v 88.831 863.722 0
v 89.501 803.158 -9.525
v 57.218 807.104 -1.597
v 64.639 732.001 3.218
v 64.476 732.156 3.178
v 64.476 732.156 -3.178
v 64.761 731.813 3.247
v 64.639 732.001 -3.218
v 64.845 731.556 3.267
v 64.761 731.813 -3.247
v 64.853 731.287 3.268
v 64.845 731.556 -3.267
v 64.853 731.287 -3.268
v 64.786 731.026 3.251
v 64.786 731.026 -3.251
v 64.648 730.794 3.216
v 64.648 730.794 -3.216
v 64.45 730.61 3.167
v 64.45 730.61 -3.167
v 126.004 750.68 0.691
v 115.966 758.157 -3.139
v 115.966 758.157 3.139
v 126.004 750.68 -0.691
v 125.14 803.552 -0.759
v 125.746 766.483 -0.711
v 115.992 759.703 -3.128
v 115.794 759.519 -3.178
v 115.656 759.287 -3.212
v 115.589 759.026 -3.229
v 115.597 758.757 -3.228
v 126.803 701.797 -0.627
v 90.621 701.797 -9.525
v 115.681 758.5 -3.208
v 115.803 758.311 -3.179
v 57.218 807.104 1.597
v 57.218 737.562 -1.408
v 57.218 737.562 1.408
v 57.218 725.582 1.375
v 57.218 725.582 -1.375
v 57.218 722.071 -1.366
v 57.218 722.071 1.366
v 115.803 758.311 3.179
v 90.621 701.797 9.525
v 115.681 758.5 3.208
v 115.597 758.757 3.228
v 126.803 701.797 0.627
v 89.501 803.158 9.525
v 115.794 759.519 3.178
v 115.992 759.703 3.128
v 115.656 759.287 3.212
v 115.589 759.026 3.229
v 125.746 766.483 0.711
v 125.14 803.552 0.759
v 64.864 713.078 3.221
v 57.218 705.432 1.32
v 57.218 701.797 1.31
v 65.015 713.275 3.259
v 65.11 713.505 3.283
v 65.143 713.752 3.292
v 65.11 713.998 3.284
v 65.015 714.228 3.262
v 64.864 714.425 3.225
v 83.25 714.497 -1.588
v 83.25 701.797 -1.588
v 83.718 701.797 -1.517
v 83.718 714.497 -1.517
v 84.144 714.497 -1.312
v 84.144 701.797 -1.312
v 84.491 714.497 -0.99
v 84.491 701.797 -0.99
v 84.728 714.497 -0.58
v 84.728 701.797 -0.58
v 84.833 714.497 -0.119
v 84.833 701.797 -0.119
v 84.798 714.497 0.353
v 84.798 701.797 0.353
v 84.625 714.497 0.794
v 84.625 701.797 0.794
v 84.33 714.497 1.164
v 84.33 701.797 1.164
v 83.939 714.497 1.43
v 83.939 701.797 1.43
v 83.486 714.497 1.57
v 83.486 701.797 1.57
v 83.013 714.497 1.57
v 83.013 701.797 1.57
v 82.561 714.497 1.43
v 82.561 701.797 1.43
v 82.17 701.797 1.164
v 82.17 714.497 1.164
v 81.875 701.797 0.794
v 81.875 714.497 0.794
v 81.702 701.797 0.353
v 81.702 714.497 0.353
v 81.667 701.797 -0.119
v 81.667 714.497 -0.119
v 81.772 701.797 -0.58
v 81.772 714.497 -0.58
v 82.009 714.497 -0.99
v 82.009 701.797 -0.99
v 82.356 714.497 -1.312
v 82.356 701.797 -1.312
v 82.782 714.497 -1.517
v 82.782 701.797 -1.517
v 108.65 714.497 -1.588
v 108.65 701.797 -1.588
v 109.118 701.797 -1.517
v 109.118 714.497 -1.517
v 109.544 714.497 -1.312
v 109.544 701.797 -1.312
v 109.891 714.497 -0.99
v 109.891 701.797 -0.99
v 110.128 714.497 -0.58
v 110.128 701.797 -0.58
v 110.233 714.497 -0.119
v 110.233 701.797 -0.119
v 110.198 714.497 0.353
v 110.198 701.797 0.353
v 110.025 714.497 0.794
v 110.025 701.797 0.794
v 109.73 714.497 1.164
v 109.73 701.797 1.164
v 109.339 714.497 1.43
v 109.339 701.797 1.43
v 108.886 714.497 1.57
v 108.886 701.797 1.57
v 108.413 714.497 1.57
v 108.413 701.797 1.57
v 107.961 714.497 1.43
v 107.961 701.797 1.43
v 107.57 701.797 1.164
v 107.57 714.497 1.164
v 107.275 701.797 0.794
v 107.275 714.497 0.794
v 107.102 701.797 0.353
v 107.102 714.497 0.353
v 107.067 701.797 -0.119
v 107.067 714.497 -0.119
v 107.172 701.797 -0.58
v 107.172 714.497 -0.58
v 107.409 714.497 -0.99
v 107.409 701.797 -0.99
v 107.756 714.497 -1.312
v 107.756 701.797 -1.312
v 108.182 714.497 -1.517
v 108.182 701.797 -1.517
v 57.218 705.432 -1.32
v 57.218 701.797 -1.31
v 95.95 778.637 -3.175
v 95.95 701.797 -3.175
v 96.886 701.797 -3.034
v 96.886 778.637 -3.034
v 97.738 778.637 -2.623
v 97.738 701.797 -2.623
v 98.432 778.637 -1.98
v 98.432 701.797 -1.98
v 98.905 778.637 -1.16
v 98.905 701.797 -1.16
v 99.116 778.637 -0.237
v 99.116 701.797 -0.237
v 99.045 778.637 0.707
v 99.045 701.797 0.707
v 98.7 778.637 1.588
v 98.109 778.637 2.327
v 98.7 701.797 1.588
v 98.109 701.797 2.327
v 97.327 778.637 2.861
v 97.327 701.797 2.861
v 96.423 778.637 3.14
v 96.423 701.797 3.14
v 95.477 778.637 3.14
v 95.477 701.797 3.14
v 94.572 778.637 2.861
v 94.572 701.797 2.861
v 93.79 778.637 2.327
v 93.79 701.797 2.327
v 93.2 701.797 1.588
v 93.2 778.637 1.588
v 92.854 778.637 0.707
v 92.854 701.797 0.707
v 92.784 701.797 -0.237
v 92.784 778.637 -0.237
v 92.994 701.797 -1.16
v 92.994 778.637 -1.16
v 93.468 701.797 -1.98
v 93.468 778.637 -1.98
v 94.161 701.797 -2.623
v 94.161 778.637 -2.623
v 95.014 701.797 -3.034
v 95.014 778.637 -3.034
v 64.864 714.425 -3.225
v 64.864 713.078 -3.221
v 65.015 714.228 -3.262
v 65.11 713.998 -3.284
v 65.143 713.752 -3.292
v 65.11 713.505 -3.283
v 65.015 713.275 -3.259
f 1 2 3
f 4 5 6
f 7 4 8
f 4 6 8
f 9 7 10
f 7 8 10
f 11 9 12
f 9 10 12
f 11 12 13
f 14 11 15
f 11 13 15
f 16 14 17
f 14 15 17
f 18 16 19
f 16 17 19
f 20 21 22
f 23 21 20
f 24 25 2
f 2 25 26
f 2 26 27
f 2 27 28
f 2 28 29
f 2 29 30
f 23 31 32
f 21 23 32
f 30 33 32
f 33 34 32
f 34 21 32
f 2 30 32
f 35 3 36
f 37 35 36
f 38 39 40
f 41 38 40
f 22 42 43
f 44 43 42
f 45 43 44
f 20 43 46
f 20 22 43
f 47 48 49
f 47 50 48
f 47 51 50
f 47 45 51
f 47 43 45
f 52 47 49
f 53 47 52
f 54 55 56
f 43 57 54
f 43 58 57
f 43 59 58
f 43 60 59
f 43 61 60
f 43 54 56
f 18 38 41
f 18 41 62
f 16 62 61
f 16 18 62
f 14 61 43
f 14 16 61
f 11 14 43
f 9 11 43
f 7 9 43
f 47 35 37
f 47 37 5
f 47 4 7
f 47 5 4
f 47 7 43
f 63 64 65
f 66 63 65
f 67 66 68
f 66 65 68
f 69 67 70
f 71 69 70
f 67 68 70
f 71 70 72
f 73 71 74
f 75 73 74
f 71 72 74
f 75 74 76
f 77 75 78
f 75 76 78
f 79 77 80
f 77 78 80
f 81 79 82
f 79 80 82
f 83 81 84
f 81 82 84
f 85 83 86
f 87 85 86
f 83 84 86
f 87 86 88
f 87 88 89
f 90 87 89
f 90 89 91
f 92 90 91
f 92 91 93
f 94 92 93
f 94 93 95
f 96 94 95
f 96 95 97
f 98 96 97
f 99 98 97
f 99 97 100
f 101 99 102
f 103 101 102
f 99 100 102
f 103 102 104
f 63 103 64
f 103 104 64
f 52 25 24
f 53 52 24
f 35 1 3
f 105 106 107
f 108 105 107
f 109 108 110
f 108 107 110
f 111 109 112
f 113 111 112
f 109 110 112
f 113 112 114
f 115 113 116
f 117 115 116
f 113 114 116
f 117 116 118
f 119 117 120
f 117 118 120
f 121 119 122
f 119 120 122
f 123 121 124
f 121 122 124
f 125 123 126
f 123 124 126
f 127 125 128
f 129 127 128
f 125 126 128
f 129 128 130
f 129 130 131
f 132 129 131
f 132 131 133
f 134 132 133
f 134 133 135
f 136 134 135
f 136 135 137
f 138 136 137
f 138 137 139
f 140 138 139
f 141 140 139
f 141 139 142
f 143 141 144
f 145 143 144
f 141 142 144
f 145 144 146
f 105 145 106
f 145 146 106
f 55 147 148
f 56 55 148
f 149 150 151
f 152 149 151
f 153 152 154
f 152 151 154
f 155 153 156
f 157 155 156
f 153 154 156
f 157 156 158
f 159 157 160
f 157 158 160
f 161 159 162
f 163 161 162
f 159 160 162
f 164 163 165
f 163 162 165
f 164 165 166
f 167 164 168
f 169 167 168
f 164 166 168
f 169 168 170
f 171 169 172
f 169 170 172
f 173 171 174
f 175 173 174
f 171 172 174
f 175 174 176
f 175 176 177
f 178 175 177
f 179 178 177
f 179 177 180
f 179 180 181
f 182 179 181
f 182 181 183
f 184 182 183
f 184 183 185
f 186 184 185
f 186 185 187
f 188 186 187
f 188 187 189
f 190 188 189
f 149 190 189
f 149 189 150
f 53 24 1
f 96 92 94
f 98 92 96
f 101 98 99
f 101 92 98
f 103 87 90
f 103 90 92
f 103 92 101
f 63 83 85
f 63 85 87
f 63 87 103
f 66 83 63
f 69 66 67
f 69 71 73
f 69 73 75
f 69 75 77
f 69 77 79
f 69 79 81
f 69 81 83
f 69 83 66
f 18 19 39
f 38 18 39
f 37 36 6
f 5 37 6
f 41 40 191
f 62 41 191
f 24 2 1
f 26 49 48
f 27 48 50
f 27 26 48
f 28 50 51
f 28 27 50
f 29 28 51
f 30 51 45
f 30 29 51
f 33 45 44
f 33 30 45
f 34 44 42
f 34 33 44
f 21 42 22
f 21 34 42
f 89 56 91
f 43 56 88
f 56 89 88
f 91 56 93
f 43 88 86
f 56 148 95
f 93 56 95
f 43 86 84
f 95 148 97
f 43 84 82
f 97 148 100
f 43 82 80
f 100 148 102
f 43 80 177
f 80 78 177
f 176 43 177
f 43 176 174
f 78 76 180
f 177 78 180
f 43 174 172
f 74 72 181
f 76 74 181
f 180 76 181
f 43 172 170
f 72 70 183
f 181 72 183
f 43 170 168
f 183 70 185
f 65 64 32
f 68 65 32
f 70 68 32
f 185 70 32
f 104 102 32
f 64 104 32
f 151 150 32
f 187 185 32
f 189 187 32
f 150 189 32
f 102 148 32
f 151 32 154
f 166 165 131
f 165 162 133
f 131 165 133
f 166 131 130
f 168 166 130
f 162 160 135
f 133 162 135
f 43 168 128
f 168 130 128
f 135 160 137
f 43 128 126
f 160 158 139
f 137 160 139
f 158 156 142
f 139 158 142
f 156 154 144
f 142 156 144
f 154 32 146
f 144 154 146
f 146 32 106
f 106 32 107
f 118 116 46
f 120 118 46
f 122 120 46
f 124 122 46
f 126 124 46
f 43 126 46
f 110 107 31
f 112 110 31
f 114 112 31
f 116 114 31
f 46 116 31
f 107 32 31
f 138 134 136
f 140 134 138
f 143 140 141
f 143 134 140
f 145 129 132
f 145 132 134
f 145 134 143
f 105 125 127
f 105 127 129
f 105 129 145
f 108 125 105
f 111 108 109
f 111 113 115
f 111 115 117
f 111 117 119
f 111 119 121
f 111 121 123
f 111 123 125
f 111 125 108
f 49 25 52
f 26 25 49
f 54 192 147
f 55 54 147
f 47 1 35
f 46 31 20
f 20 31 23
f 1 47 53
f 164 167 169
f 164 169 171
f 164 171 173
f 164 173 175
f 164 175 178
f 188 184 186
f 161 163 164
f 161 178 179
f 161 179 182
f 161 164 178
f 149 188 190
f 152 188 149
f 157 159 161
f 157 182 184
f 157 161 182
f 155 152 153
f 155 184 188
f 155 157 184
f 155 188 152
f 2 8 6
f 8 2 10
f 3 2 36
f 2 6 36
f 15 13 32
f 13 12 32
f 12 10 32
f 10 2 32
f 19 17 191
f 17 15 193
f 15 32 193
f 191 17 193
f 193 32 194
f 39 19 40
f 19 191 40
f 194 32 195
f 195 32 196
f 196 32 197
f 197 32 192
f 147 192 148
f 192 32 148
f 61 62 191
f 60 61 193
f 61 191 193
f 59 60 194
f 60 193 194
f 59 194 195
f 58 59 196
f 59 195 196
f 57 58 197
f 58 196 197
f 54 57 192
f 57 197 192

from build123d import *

# Parameters (mm, degrees)
BOSS_EXTRUDE1_DEPTH      = 9.525
BOSS_EXTRUDE1_DEPTH_BACK = 9.525
CUT_SWEEP2_START         = 153.457157687
CUT_SWEEP2_OUTLINE_W     = 59
CUT_SWEEP2_OUTLINE_H     = 64
CUT_SWEEP2_DEPTH         = 10.542842313
CUT_SWEEP6_START         = 153.457157687
CUT_SWEEP6_OUTLINE_W     = 53
CUT_SWEEP6_OUTLINE_H     = 64
CUT_SWEEP6_DEPTH         = 9.143384714
SKETCH21_W               = 71.62814367
SKETCH21_H               = 75.485551221
CUT_EXTRUDE5_DEPTH       = 47.371
CUT_EXTRUDE6_DEPTH       = 875.211365037
CUT_EXTRUDE6_DEPTH_BACK  = 875.211365037
SKETCH23_R               = 3.175
CUT_EXTRUDE7_DEPTH       = 558.8
CUT_EXTRUDE17_DEPTH      = 875.211365037
CUT_EXTRUDE17_DEPTH_BACK = 875.211365037
SKETCH24_W               = 149.671164142
SKETCH24_H               = 168.486967634
SKETCH24_H_2             = 161.925
SKETCH31_R               = 1.5875
CUT_EXTRUDE18_DEPTH      = 12.7


with BuildPart() as part:
    # Sketch1 → Boss-Extrude1 (new, two sides: drawn at the far end of the back side and taken through both)
    with BuildSketch(Plane.XY.offset(-BOSS_EXTRUDE1_DEPTH_BACK)):
        Polygon((57.217766507, 219.836565958), (134.681996719, 219.836565958), (125.140068317, 803.55209701), (88.830980485, 863.721914098), (57.217766507, 807.103985498), align=None)
    extrude(amount=BOSS_EXTRUDE1_DEPTH + BOSS_EXTRUDE1_DEPTH_BACK)

    # Cut-Sweep1: sweep along a path in Sketch4
    with BuildLine(Plane.XY.offset(9.525)) as cut_sweep1_path:
        Line((95.949881613, 219.836565958), (88.830980485, 863.721914098))
    # Sketch2 → Cut-Sweep1 (sweep, cut)
    with BuildSketch(Plane.XZ.offset(-219.836565958)):
        Polygon((95.949881613, 9.525), (134.681996719, 0), (134.681996719, 9.525), align=None)
    sweep(path=cut_sweep1_path.line, mode=Mode.SUBTRACT)

    # Cut-Sweep2: read off the stored shape, not the designer's step
    # Cut-Sweep2 outline → Cut-Sweep2 (cut)
    with BuildSketch(Plane(origin=(0, 0, 0), x_dir=(0.9721406430200956, -0.0370263288920756, -0.23145544097568965), z_dir=(0.2343983152423991, 0.15356253367517805, 0.9599354030677193)).offset(CUT_SWEEP2_START)):
        with Locations((63.5, 822)):
            Rectangle(CUT_SWEEP2_OUTLINE_W, CUT_SWEEP2_OUTLINE_H)
    extrude(amount=CUT_SWEEP2_DEPTH, mode=Mode.SUBTRACT)

    # Cut-Sweep3: sweep along a path in Sketch8
    with BuildLine(Plane.XY.offset(9.525)) as cut_sweep3_path:
        Line((95.949881613, 219.836565958), (88.830980485, 863.721914098))
    # Sketch7 → Cut-Sweep3 (sweep, cut)
    with BuildSketch(Plane.XZ.offset(-219.836565958)):
        Polygon((95.949881613, 9.525), (57.217766507, 0), (57.217766507, 9.525), align=None)
    sweep(path=cut_sweep3_path.line, mode=Mode.SUBTRACT)

    # Cut-Sweep4: sweep along a path in Sketch10
    with BuildLine(Plane(origin=(3.4015871, 0.0376085, -13.832090615), x_dir=(0.9710677735095292, -0.0006492893666849942, 0.23880317768941897), z_dir=(-0.23880406037428656, -0.002640256529482778, 0.9710641841784778))) as cut_sweep4_path:
        Line((55.419591582, 807.105343631), (88.664251397, 803.18099011))
    # Sketch9 → Cut-Sweep4 (sweep, cut)
    with BuildSketch(Plane(origin=(98.36840601, 1.087577095, 0), x_dir=(0, 0, 1), z_dir=(-0.9999388862366849, -0.011055486951654862, 0))):
        Polygon((9.525, 802.119504525), (27.927952665, 862.687059056), (0, 862.687059056), align=None)
    sweep(path=cut_sweep4_path.line, mode=Mode.SUBTRACT)

    # Cut-Sweep5: sweep along a path in Sketch12
    with BuildLine(Plane(origin=(0, 0, -9.525), x_dir=(-1, 0, 0), z_dir=(0, 0, -1))) as cut_sweep5_path:
        Line((-88.830980485, 863.721914098), (-95.949881613, 219.836565958))
    # Sketch11 → Cut-Sweep5 (sweep, cut)
    with BuildSketch(Plane.XZ.offset(-219.836565958)):
        Polygon((95.949881613, -9.525), (134.681996719, 0), (134.681996719, -15.883536915), (57.217766507, -15.883536915), (57.217766507, 0), align=None)
    sweep(path=cut_sweep5_path.line, mode=Mode.SUBTRACT)

    # Cut-Sweep6: read off the stored shape, not the designer's step
    # Cut-Sweep6 outline → Cut-Sweep6 (cut)
    with BuildSketch(Plane(origin=(0, 0, 0), x_dir=(0.9721406430200958, -0.03702632889207545, 0.2314554409756887), z_dir=(0.23439831524239813, 0.1535625336751781, -0.9599354030677195)).offset(CUT_SWEEP6_START)):
        with Locations((66.5, -822)):
            Rectangle(CUT_SWEEP6_OUTLINE_W, CUT_SWEEP6_OUTLINE_H)
    extrude(amount=CUT_SWEEP6_DEPTH, mode=Mode.SUBTRACT)

    # Sketch21 → Cut-Extrude5 (cut)
    with BuildSketch(Plane(origin=(-23.933102236, 16.341018935, -105.585382191), x_dir=(-0.9758175121644082, -0.033431767496308724, 0.2160150454837301), z_dir=(-0.2185867858615091, 0.14924646088248067, -0.9643367207364807))):
        with Locations((-95.99768501, 822.261491576)):
            Rectangle(SKETCH21_W, SKETCH21_H)
    extrude(amount=CUT_EXTRUDE5_DEPTH, mode=Mode.SUBTRACT)

    # Sketch22 → Cut-Extrude6 (cut, two sides: drawn at the far end of the back side and taken through both)
    with BuildSketch(Plane.XY.offset(-CUT_EXTRUDE6_DEPTH_BACK)):
        with BuildLine():
            Line((57.217766507, 737.561994928), (64.475710809, 732.15618288))
            ThreePointArc((64.475710809, 732.15618288), (64.859122479, 731.376710767), (64.450428737, 730.610192203))
            Line((64.450428737, 730.610192203), (57.217766507, 725.582342683))
            Line((57.217766507, 725.582342683), (57.217766507, 737.561994928))
        make_face()
        with BuildLine():
            Line((57.217766507, 722.071065301), (64.863611969, 714.425219839))
            ThreePointArc((64.863611969, 714.425219839), (65.14259276, 713.751700629), (64.863611969, 713.07818142))
            Line((64.863611969, 713.07818142), (57.217766507, 705.432335958))
            Line((57.217766507, 705.432335958), (57.217766507, 722.071065301))
        make_face()
        with BuildLine():
            Line((125.746024678, 766.483474766), (115.991696873, 759.702666979))
            ThreePointArc((115.991696873, 759.702666979), (115.583003131, 758.936148415), (115.966414801, 758.156676302))
            Line((115.966414801, 758.156676302), (126.004357543, 750.680284978))
            Line((126.004357543, 750.680284978), (125.746024678, 766.483474766))
        make_face()
        with BuildLine():
            Line((130.504368952, 475.397717553), (120.864153688, 462.45458434))
            ThreePointArc((120.864153688, 462.45458434), (120.675678689, 461.901197798), (120.845958337, 461.341944429))
            Line((120.845958337, 461.341944429), (130.972260191, 446.775056406))
            Line((130.972260191, 446.775056406), (130.504368952, 475.397717553))
        make_face()
        with BuildLine():
            Line((57.217766507, 423.998589411), (65.145848829, 412.59388421))
            ThreePointArc((65.145848829, 412.59388421), (65.316128476, 412.03463084), (65.127653478, 411.481244299))
            Line((65.127653478, 411.481244299), (57.217766507, 400.861282196))
            Line((57.217766507, 400.861282196), (57.217766507, 423.998589411))
        make_face()
    extrude(amount=CUT_EXTRUDE6_DEPTH + CUT_EXTRUDE6_DEPTH_BACK, mode=Mode.SUBTRACT)

    # Sketch23 → Cut-Extrude7 (cut)
    with BuildSketch(Plane.XZ.offset(-219.836565958)):
        with Locations(Location((95.949881613, 0, 0), (0, 0, 270))):
            Circle(SKETCH23_R)
    extrude(amount=-CUT_EXTRUDE7_DEPTH, mode=Mode.SUBTRACT)

    # Sketch24 → Cut-Extrude17 (cut, two sides: drawn at the far end of the back side and taken through both)
    with BuildSketch(Plane.XY.offset(-CUT_EXTRUDE17_DEPTH_BACK)):
        with Locations((94.66698592, 293.703430281)):
            Rectangle(SKETCH24_W, SKETCH24_H)
        with Locations((94.66698592, 458.909414098)):
            Rectangle(SKETCH24_W, SKETCH24_H_2)
        with Locations((94.66698592, 620.834414098)):
            Rectangle(SKETCH24_W, SKETCH24_H_2)
    extrude(amount=CUT_EXTRUDE17_DEPTH + CUT_EXTRUDE17_DEPTH_BACK, mode=Mode.SUBTRACT)

    # Sketch31 → Cut-Extrude18 (cut)
    with BuildSketch(Plane.XZ.offset(-701.796914098)):
        with Locations(Location((83.249881613, 0, 0), (0, 0, 270))):
            Circle(SKETCH31_R)
        with Locations(Location((108.649881613, 0, 0), (0, 0, 270))):
            Circle(SKETCH31_R)
    extrude(amount=-CUT_EXTRUDE18_DEPTH, mode=Mode.SUBTRACT)


solid = part.part
